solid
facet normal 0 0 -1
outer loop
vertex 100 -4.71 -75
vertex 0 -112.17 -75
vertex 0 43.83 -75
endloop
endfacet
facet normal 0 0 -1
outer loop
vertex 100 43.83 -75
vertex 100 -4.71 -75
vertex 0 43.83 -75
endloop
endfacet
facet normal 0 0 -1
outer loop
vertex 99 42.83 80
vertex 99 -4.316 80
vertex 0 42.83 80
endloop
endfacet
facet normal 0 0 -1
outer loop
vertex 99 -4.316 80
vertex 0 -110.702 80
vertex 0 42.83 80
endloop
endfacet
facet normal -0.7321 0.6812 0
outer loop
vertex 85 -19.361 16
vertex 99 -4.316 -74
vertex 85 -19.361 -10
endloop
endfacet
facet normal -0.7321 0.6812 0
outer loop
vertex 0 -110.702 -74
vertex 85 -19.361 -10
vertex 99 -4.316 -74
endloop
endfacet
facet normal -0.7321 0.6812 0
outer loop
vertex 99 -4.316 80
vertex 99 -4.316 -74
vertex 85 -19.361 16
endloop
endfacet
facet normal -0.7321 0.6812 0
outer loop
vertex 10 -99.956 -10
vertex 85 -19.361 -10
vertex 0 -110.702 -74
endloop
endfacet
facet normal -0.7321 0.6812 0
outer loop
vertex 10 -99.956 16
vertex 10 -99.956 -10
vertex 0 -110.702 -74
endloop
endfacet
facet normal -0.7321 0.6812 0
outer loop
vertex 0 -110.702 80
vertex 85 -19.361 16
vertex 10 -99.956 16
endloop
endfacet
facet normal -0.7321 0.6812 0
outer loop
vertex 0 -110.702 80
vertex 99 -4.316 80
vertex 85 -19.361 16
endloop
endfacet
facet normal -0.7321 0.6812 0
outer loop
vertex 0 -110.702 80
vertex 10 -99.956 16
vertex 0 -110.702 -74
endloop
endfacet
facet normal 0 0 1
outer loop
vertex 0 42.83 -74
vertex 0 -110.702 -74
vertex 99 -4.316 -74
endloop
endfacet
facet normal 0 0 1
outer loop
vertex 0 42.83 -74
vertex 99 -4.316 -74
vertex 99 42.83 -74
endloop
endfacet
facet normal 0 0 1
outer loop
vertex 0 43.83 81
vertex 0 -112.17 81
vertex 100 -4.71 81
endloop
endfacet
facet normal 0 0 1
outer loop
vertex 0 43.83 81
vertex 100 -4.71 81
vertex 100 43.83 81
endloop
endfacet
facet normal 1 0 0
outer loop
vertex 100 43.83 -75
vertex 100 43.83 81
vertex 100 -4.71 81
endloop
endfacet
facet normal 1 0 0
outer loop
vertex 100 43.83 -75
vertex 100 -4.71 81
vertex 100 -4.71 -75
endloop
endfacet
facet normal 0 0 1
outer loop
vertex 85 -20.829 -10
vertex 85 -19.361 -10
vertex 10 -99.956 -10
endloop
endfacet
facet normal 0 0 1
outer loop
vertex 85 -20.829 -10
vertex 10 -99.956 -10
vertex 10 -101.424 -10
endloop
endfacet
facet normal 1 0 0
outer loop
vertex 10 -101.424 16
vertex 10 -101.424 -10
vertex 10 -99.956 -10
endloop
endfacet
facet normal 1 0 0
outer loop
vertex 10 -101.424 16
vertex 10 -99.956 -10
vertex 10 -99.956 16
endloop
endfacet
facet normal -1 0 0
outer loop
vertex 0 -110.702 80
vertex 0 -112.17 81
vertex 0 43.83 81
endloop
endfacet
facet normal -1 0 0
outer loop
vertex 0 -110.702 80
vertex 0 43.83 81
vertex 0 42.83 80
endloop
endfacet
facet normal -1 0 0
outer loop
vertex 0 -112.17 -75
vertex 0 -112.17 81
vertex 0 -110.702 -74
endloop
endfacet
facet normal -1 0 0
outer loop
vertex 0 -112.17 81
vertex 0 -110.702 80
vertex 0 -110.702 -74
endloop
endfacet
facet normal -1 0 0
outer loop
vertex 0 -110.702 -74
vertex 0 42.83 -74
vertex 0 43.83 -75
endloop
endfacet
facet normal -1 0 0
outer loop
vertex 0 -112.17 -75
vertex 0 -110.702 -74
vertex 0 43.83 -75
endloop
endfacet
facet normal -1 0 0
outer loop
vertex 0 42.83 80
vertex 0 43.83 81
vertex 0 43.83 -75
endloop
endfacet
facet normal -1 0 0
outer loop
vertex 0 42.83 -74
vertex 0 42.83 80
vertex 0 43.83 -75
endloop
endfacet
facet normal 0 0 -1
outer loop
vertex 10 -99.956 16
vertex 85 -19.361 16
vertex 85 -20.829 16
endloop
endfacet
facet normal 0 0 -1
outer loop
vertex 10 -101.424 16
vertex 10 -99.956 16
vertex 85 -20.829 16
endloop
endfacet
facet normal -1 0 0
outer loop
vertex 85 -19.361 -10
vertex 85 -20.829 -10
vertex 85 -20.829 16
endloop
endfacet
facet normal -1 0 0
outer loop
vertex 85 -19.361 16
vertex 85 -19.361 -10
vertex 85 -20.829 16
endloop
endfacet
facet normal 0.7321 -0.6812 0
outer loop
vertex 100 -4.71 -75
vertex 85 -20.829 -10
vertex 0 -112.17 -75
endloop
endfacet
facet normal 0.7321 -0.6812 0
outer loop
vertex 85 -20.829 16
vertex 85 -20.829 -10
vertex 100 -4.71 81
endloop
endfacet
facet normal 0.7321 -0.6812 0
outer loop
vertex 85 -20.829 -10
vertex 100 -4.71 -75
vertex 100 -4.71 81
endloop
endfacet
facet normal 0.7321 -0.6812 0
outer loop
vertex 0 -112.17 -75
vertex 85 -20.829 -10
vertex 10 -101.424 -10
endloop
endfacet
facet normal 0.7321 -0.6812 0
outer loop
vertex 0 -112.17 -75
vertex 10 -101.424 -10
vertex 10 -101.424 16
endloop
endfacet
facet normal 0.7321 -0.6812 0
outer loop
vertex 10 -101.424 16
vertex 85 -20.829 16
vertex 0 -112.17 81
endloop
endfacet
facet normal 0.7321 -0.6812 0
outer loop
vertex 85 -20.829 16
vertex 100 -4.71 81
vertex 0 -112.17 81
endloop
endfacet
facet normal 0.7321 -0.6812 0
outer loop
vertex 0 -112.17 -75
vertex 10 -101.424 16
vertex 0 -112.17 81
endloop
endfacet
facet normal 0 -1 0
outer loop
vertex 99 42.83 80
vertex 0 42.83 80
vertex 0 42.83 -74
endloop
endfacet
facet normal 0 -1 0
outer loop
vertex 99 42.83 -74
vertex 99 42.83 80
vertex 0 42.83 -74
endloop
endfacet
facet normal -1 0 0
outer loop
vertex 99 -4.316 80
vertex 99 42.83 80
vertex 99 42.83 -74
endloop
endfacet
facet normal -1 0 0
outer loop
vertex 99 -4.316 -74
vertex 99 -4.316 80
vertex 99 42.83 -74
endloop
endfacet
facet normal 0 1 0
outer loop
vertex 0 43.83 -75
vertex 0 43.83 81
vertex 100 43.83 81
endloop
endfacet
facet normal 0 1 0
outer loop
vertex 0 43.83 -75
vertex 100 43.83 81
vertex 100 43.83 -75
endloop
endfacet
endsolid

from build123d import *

# Parameters (mm, degrees)
ESQUISSE1_W              = 156
ESQUISSE1_H              = 156
BOSS_EXTRU_3_DEPTH       = 100
ESQUISSE5_W              = 75
ESQUISSE5_H              = 26
ENL_V_MAT_EXTRU_4_DEPTH  = 100
ENL_V_MAT_EXTRU_11_DEPTH = 217.60592354
COQUE6_T                 = -1
ENL_V_MAT_EXTRU_12_REACH = 178.199


with BuildPart() as part:
    # Esquisse1 → Boss.-Extru.3 (new body)
    with BuildSketch(Plane(origin=(0, 0, 0), x_dir=(0, 0, -1), z_dir=(1, 0, 0))):
        with Locations((-3, -34.170076726)):
            Rectangle(ESQUISSE1_W, ESQUISSE1_H)
    extrude(amount=BOSS_EXTRU_3_DEPTH)

    # Esquisse5 → Enlèv. mat.-Extru.4 (cut)
    with BuildSketch(Plane.XZ.offset(112.170076726)):
        with Locations((47.5, 3)):
            Rectangle(ESQUISSE5_W, ESQUISSE5_H)
    extrude(amount=-ENL_V_MAT_EXTRU_4_DEPTH, mode=Mode.SUBTRACT)

    # Esquisse8 → Enlèv. mat.-Extru.11 (cut, through all)
    with BuildSketch(Plane.XY.offset(81)):
        Polygon((100, -4.709521913), (0, -112.170076726), (100, -112.170076726), align=None)
    extrude(amount=-ENL_V_MAT_EXTRU_11_DEPTH, mode=Mode.SUBTRACT)

    # Coque6
    coque6_openings = [part.faces().sort_by_distance(p)[0] for p in [
        (0, -34.170076726, 3),
    ]]
    offset(amount=COQUE6_T, openings=coque6_openings, kind=Kind.INTERSECTION)

    # Esquisse10 → Enlèv. mat.-Extru.12 (cut, up to next)
    with BuildSketch(Plane(origin=(0, 0, -11), x_dir=(-1, 0, 0), z_dir=(0, 0, -1)), mode=Mode.PRIVATE) as enl_v_mat_extru_12_sk1:
        Polygon((-9, -101.030710895), (-86, -18.286083689), (-86, -11.170076726), (-9, -11.170076726), align=None)
    enl_v_mat_extru_12_tool1 = extrude(enl_v_mat_extru_12_sk1.sketch, amount=-ENL_V_MAT_EXTRU_12_REACH, mode=Mode.PRIVATE) & part.part
    add(enl_v_mat_extru_12_tool1.solids().sort_by_distance((36.55005, -41.297676, -11))[0], mode=Mode.SUBTRACT)


solid = part.part
